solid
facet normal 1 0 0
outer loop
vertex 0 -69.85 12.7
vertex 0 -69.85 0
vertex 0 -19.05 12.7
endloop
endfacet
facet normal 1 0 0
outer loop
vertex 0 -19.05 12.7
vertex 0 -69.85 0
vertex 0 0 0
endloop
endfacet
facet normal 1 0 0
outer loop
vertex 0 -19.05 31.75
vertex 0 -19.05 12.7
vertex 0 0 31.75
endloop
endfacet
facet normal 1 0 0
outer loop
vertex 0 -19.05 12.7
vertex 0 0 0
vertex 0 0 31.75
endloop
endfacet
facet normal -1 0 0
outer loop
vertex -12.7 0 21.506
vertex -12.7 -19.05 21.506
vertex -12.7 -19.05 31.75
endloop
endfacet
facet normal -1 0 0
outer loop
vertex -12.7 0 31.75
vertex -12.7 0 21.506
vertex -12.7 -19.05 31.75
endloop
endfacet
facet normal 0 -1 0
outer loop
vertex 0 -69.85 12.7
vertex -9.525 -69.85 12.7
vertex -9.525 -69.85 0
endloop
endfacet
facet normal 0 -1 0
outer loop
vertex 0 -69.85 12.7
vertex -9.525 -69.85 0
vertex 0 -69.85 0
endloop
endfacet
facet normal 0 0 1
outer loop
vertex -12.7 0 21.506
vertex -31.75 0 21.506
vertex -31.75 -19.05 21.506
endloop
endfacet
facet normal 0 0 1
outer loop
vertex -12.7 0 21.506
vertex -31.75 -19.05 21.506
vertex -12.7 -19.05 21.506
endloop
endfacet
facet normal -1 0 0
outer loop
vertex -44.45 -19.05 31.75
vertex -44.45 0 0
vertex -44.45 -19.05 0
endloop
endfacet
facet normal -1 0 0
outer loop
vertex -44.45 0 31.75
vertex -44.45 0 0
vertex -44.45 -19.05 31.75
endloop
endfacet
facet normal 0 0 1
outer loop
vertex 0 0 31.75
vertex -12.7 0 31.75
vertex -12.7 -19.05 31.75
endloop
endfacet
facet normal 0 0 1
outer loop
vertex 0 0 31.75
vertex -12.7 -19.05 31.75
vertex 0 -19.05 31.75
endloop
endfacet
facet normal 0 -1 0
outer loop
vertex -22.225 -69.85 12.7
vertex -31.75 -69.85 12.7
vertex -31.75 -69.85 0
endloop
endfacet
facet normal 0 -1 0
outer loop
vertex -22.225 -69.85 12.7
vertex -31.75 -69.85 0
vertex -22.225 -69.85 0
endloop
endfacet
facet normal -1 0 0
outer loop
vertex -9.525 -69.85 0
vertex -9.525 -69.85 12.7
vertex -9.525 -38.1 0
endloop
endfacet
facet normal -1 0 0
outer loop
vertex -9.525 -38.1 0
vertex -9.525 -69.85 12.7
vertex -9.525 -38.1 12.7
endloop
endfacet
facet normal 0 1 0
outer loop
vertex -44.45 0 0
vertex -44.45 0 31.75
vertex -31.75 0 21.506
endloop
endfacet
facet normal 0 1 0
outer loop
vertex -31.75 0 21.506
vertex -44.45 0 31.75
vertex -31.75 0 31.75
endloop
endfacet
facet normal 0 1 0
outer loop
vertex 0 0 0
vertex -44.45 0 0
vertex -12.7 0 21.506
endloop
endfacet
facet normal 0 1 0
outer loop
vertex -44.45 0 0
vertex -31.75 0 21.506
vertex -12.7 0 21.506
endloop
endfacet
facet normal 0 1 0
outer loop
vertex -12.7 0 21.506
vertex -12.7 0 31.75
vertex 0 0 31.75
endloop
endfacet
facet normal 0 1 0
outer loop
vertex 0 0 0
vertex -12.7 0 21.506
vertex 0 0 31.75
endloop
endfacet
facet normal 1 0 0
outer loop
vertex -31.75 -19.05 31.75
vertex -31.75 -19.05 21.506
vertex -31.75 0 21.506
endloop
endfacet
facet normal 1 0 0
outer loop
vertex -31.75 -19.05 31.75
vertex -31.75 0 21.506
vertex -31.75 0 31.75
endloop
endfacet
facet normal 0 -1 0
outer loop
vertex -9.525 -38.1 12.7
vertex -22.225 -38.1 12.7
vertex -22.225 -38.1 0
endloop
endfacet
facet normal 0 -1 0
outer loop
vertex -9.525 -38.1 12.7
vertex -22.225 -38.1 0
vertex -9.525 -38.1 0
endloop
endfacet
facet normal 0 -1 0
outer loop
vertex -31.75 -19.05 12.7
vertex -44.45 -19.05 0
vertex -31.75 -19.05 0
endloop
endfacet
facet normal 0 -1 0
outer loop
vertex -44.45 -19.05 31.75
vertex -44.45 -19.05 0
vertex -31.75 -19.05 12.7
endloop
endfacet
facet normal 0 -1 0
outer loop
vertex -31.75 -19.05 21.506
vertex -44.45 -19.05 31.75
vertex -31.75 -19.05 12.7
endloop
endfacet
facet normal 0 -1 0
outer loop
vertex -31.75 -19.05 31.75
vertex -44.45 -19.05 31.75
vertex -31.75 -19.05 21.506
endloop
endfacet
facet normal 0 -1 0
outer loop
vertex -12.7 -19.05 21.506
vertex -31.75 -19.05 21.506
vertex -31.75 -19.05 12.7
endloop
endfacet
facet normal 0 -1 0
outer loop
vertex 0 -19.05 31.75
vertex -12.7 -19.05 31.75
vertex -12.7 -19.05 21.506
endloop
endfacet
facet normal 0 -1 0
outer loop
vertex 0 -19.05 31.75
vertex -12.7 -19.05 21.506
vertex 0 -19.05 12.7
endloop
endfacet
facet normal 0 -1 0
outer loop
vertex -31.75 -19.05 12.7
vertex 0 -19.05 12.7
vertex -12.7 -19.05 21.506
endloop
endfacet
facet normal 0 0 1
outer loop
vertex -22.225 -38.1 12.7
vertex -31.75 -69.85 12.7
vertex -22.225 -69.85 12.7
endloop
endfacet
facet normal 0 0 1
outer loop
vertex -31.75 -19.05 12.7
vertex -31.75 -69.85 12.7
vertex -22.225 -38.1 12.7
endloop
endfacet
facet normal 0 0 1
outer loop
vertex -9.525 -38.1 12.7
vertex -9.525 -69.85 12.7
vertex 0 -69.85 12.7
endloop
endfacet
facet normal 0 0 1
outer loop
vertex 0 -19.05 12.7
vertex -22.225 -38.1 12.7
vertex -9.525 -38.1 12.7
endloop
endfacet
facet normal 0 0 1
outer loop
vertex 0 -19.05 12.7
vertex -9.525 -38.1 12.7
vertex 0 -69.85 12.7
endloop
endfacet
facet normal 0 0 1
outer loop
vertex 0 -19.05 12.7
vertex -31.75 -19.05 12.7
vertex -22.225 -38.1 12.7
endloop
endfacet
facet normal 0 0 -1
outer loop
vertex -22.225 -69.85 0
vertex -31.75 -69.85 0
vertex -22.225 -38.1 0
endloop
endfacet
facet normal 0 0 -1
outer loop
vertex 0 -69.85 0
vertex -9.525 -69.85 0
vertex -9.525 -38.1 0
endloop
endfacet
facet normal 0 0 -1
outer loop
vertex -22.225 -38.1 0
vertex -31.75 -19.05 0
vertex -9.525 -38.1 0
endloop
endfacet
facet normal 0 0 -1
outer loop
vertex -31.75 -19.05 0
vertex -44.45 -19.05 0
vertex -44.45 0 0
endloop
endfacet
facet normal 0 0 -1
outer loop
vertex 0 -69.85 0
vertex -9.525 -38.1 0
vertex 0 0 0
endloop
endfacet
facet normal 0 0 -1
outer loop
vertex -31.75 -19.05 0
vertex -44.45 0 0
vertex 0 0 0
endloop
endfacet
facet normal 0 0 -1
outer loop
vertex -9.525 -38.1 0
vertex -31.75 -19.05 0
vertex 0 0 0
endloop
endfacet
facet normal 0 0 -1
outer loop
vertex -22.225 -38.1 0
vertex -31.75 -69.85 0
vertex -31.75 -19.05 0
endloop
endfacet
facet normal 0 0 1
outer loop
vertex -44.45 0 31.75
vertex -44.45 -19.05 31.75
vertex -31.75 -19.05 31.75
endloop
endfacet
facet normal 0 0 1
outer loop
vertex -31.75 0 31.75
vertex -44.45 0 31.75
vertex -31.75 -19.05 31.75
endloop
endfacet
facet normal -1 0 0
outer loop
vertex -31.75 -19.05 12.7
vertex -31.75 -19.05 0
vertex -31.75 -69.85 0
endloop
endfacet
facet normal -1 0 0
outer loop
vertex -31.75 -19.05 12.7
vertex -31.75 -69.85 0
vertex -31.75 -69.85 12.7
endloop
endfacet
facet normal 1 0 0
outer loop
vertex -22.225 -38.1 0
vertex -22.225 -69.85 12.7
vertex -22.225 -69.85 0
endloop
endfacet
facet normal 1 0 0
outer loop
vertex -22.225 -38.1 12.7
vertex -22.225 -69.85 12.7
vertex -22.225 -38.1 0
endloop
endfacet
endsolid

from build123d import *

# Parameters (mm, degrees)
F0_W     = 44.45
F0_H     = 31.75
F1_DEPTH = 19.05
F2_W     = 19.05
F2_H     = 10.2438246012
F3_DEPTH = 25.4
F4_W     = 31.75
F4_H     = 12.7
F5_DEPTH = 50.8
F7_W     = 12.7
F7_H     = 31.75
F8_DEPTH = 25.4
F6_W     = 12.7
F6_H     = 12.7
F9_DEPTH = 25.4


with BuildPart() as f1:
    # F0 (on Front) → F1 (new body)
    with BuildSketch(Plane.XZ):
        with Locations((-22.225, 15.875)):
            Rectangle(F0_W, F0_H)
    extrude(amount=F1_DEPTH)

    # F2 (on face) → F3 (cut)
    with BuildSketch(Plane.XZ.offset(19.05)):
        with Locations((-22.225, 26.6280876994)):
            Rectangle(F2_W, F2_H)
    extrude(amount=-F3_DEPTH, mode=Mode.SUBTRACT)

    # F4 (on face) → F5 (join)
    with BuildSketch(Plane.XZ.offset(19.05)):
        with Locations((-15.875, 6.35)):
            Rectangle(F4_W, F4_H)
    extrude(amount=F5_DEPTH)

    # F7 (on face) → F8 (cut)
    with BuildSketch(Plane.XY.offset(12.7)):
        with Locations((-15.875, -53.975)):
            Rectangle(F7_W, F7_H)
    extrude(amount=-F8_DEPTH, mode=Mode.SUBTRACT)

    # F6 (on face) → F9 (cut)
    with BuildSketch(Plane.XZ.offset(69.85)):
        with Locations((-15.875, 6.35)):
            Rectangle(F6_W, F6_H)
    extrude(amount=-F9_DEPTH, mode=Mode.SUBTRACT)


solid = f1.part
